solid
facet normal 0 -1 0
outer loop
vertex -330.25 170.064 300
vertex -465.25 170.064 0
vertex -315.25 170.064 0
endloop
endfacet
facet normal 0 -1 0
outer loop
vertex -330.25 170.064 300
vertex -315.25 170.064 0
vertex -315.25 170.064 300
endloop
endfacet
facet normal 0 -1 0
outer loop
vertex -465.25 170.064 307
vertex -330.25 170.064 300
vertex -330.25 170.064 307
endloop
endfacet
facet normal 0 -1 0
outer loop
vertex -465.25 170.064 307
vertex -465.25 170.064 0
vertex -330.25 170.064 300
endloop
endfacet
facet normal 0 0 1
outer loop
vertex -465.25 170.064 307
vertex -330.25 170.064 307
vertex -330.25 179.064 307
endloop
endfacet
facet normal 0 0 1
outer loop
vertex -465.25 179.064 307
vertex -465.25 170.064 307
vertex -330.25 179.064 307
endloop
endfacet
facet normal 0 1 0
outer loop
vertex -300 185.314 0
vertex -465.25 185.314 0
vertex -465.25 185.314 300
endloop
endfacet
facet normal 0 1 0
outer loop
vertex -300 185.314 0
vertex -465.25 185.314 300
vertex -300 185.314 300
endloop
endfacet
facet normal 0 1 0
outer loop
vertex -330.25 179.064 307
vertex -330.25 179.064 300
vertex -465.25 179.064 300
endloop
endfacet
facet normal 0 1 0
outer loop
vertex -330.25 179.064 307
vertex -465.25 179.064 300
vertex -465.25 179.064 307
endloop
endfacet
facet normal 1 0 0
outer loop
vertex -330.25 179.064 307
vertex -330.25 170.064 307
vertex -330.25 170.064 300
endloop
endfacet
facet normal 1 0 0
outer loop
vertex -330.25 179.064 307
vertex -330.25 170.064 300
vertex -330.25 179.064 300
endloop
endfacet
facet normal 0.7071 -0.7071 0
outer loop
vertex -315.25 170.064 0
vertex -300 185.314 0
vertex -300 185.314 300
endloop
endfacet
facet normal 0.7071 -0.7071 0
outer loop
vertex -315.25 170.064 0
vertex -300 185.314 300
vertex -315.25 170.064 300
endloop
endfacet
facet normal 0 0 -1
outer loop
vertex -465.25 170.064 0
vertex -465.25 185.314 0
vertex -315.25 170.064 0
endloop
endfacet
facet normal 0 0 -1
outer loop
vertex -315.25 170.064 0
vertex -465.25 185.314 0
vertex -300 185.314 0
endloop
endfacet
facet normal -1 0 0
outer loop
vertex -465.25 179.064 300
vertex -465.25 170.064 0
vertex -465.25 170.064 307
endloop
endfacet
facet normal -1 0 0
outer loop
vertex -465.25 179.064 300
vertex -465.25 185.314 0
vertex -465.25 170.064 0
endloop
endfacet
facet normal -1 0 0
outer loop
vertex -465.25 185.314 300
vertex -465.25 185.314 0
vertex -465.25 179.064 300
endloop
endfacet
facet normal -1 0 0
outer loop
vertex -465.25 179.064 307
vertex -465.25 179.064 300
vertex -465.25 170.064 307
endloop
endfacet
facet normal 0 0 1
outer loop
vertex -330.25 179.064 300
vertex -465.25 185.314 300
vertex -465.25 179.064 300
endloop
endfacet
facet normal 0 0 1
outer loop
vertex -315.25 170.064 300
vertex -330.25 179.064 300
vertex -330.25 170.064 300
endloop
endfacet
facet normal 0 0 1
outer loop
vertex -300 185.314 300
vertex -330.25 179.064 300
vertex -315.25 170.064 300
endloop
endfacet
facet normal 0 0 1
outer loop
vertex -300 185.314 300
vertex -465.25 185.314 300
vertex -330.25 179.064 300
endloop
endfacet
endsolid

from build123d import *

# Parameters (mm, degrees)
ESQUISSE1_W                         = 165.25
ESQUISSE1_H                         = 15.25
BOSS_EXTRU_1_DEPTH                  = 300
ESQUISSE3_W                         = 7
ESQUISSE3_H                         = 9
BOSS_EXTRU_4_DEPTH                  = 165.25
ENL_V_MAT_EXTRU_2_REACH             = 302
ENL_V_MAT_EXTRU_2_DIRECTION_2_REACH = 9
ESQUISSE4_W                         = 24
ESQUISSE4_H                         = 9
ENL_V_MAT_EXTRU_3_DEPTH             = 7


with BuildPart() as part:
    # Esquisse1 → Boss.-Extru.1 (new body)
    with BuildSketch(Plane.XY):
        with Locations((-382.625, 177.688864629)):
            Rectangle(ESQUISSE1_W, ESQUISSE1_H)
    extrude(amount=BOSS_EXTRU_1_DEPTH)

    # Esquisse3 → Boss.-Extru.4 (add)
    with BuildSketch(Plane.ZY.offset(465.25)):
        with Locations((303.5, 174.563864629)):
            Rectangle(ESQUISSE3_W, ESQUISSE3_H)
    extrude(amount=-BOSS_EXTRU_4_DEPTH)

    # Esquisse2 → Enlèv. mat.-Extru.2 (cut, up to next)
    with BuildSketch(Plane.XY.offset(300), mode=Mode.PRIVATE) as enl_v_mat_extru_2_sk1:
        Polygon((-300, 185.313864629), (-315.25, 170.063864629), (-300, 170.063864629), align=None)
    enl_v_mat_extru_2_tool1 = extrude(enl_v_mat_extru_2_sk1.sketch, amount=-ENL_V_MAT_EXTRU_2_REACH, mode=Mode.PRIVATE) & part.part
    add(enl_v_mat_extru_2_tool1.solids().sort_by_distance((-305.083333, 175.147198, 300))[0], mode=Mode.SUBTRACT)

    # Esquisse2 → Enlèv. mat.-Extru.2 direction 2 (cut, up to next)
    with BuildSketch(Plane.XY.offset(300), mode=Mode.PRIVATE) as enl_v_mat_extru_2_direction_2_sk1:
        Polygon((-300, 185.313864629), (-315.25, 170.063864629), (-300, 170.063864629), align=None)
    enl_v_mat_extru_2_direction_2_tool1 = extrude(enl_v_mat_extru_2_direction_2_sk1.sketch, amount=ENL_V_MAT_EXTRU_2_DIRECTION_2_REACH, mode=Mode.PRIVATE) & part.part
    add(enl_v_mat_extru_2_direction_2_tool1.solids().sort_by_distance((-305.083333, 175.147198, 300))[0], mode=Mode.SUBTRACT)

    # Esquisse4 → Enlèv. mat.-Extru.3 (cut)
    with BuildSketch(Plane.XY.offset(307)):
        with Locations((-318.25, 174.563864629)):
            Rectangle(ESQUISSE4_W, ESQUISSE4_H)
    extrude(amount=-ENL_V_MAT_EXTRU_3_DEPTH, mode=Mode.SUBTRACT)


solid = part.part
